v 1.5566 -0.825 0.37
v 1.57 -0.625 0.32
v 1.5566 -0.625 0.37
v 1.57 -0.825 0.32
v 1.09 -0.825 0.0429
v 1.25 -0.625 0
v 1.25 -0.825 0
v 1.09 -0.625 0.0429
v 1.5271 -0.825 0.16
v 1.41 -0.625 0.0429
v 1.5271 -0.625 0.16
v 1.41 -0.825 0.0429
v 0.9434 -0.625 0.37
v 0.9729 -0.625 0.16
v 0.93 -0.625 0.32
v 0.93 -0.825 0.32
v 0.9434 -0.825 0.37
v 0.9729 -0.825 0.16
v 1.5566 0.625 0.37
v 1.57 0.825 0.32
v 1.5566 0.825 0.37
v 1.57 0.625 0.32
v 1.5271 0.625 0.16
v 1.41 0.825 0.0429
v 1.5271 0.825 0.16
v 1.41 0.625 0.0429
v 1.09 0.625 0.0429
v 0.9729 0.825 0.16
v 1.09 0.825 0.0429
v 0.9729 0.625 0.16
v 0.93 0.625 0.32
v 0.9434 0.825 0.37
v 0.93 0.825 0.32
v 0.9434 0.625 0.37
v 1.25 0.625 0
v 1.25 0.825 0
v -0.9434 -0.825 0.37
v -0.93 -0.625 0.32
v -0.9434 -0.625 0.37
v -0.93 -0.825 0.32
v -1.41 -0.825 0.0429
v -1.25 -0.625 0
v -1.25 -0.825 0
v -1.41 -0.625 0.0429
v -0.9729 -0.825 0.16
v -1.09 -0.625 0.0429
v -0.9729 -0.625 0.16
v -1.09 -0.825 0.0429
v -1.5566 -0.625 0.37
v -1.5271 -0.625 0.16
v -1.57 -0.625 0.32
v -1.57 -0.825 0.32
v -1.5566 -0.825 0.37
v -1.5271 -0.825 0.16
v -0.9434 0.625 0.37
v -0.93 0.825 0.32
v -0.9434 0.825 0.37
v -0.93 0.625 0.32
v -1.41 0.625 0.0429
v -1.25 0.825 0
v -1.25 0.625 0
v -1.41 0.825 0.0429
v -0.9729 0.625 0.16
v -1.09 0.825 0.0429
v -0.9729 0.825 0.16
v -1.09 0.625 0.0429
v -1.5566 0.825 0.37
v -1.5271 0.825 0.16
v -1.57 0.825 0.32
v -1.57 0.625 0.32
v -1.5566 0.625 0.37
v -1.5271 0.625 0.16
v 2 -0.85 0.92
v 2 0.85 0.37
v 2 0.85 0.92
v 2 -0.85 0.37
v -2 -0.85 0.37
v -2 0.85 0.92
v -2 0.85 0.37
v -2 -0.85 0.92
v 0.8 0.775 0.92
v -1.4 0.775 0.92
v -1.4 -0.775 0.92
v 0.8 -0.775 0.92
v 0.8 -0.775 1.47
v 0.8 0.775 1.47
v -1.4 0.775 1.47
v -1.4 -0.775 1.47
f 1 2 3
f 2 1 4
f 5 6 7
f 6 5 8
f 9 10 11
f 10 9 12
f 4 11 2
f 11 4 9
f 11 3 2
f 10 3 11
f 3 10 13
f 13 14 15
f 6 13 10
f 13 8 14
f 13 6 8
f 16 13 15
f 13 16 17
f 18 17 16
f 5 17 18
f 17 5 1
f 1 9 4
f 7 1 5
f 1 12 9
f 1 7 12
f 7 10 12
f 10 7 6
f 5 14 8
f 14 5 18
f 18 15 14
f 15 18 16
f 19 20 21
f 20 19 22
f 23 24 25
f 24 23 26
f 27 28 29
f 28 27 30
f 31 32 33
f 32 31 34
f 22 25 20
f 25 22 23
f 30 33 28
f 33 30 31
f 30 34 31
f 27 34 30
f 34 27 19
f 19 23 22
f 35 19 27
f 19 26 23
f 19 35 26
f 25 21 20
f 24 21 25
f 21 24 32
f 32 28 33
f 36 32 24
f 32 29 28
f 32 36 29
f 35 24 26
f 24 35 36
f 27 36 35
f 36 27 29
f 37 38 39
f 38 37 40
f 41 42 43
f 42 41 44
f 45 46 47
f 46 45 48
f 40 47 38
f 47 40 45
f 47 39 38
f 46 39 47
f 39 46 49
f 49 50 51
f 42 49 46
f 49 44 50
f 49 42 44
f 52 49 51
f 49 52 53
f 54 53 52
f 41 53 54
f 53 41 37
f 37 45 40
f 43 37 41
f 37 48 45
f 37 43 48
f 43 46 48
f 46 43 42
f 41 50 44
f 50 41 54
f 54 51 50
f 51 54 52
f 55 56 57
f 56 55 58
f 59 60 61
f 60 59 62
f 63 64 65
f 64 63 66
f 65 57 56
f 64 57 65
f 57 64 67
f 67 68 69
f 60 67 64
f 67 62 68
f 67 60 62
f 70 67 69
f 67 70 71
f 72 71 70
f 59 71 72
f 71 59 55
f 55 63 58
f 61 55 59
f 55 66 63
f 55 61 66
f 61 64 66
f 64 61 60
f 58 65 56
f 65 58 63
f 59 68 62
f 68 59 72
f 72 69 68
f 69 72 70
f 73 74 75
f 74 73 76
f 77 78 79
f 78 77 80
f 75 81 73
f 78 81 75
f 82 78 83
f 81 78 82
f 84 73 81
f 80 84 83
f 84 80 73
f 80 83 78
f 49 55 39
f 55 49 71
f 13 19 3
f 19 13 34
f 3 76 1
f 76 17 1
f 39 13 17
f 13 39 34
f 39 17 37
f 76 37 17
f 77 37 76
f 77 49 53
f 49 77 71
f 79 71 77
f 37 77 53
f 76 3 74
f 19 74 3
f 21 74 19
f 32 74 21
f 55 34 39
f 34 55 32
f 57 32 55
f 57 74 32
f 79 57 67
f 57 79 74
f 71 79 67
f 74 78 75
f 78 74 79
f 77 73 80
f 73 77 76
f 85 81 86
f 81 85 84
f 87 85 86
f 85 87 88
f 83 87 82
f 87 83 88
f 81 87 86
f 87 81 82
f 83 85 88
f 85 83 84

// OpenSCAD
// Car — generic four-wheel passenger car, drawn per parked car by the
// dynamic car batch (see render.carInstancesFor). The body colour is
// supplied via per-instance ColorTint so a row of parked cars reads as
// a row of different-coloured vehicles; everything else (wheels, glass)
// uses its own SCAD colour that gets multiplied with the tint.
//
// Conventions, units, and axis docs: see models-src/README.md.
//
//   +X = forward (the car's front faces +X)
//   +Y = lateral (driver's left when facing +X)
//   +Z = up
//
// Sized for a generic sedan: 4.0 m long × 1.7 m wide × ~1.5 m tall.

$fn = 12;

// ── Dimensions (metres) ────────────────────────────────────────────────
body_len = 4.00; // along X
body_w   = 1.70; // along Y
body_h   = 0.55; // lower body, from above the wheels to the windowsill

cabin_len = 2.20; // along X — sits roughly over the rear half
cabin_w   = 1.55; // slightly inset from body sides
cabin_h   = 0.55; // glass section above the body
cabin_x   = -0.30; // pulled back from centre so the hood is longer than the trunk

wheel_r        = 0.32;
wheel_thickness = 0.20;
wheelbase      = 2.50; // distance between front and rear axles along X
track          = 1.45; // distance between left and right wheels along Y

// Derived Z anchors
body_z  = wheel_r + 0.05;       // body sits just above the wheel tops
cabin_z = body_z + body_h;       // cabin sits on the body
ride_h  = body_z + body_h + cabin_h; // total car height to the roof

// ── Parts ──────────────────────────────────────────────────────────────
module wheel(x, y) {
    color([0.10, 0.10, 0.10]) // tyre black
    translate([x, y, wheel_r])
        rotate([90, 0, 0])
            cylinder(h = wheel_thickness, r = wheel_r, center = true);
}

module wheels() {
    wheel(+wheelbase / 2, -track / 2);
    wheel(+wheelbase / 2, +track / 2);
    wheel(-wheelbase / 2, -track / 2);
    wheel(-wheelbase / 2, +track / 2);
}

module body() {
    // White-ish in SCAD so the per-instance ColorTint can show the car's
    // colour. Per-vertex multiply gives (tint × 0.92), still readable.
    color([0.92, 0.92, 0.92])
    translate([0, 0, body_z + body_h / 2])
        cube([body_len, body_w, body_h], center = true);
}

module cabin() {
    // Glass cabin, tinted blue-grey. Multiplied with the per-instance
    // tint this lands in the dark-glass range regardless of car colour.
    color([0.30, 0.45, 0.55])
    translate([cabin_x, 0, cabin_z + cabin_h / 2])
        cube([cabin_len, cabin_w, cabin_h], center = true);
}

module headlights() {
    // Two small bright pads on the front face. Near-white so the
    // per-instance tint still leaves them noticeably brighter than the
    // body.
    color([1.0, 0.95, 0.80])
    for (y = [-body_w / 2 + 0.20, +body_w / 2 - 0.20])
        translate([body_len / 2 - 0.05, y, body_z + body_h * 0.45])
            cube([0.10, 0.20, 0.20], center = true);
}

module taillights() {
    color([0.85, 0.20, 0.20])
    for (y = [-body_w / 2 + 0.20, +body_w / 2 - 0.20])
        translate([-body_len / 2 + 0.05, y, body_z + body_h * 0.45])
            cube([0.10, 0.20, 0.20], center = true);
}

module car() {
    wheels();
    body();
    cabin();
    headlights();
    taillights();
}

car();

// ── Footprint metadata ─────────────────────────────────────────────────
// Half-extents in SCAD coords (X, Y). The car batch lays out a grid of
// instances inside each parking lot — the renderer doesn't currently
// read this footprint, but emitting it keeps the pipeline consistent
// with the building meshes and lets a future parking-lot density tuner
// query the canonical car size.
echo("MOGUL_META", "footprint", body_len / 2, body_w / 2);
